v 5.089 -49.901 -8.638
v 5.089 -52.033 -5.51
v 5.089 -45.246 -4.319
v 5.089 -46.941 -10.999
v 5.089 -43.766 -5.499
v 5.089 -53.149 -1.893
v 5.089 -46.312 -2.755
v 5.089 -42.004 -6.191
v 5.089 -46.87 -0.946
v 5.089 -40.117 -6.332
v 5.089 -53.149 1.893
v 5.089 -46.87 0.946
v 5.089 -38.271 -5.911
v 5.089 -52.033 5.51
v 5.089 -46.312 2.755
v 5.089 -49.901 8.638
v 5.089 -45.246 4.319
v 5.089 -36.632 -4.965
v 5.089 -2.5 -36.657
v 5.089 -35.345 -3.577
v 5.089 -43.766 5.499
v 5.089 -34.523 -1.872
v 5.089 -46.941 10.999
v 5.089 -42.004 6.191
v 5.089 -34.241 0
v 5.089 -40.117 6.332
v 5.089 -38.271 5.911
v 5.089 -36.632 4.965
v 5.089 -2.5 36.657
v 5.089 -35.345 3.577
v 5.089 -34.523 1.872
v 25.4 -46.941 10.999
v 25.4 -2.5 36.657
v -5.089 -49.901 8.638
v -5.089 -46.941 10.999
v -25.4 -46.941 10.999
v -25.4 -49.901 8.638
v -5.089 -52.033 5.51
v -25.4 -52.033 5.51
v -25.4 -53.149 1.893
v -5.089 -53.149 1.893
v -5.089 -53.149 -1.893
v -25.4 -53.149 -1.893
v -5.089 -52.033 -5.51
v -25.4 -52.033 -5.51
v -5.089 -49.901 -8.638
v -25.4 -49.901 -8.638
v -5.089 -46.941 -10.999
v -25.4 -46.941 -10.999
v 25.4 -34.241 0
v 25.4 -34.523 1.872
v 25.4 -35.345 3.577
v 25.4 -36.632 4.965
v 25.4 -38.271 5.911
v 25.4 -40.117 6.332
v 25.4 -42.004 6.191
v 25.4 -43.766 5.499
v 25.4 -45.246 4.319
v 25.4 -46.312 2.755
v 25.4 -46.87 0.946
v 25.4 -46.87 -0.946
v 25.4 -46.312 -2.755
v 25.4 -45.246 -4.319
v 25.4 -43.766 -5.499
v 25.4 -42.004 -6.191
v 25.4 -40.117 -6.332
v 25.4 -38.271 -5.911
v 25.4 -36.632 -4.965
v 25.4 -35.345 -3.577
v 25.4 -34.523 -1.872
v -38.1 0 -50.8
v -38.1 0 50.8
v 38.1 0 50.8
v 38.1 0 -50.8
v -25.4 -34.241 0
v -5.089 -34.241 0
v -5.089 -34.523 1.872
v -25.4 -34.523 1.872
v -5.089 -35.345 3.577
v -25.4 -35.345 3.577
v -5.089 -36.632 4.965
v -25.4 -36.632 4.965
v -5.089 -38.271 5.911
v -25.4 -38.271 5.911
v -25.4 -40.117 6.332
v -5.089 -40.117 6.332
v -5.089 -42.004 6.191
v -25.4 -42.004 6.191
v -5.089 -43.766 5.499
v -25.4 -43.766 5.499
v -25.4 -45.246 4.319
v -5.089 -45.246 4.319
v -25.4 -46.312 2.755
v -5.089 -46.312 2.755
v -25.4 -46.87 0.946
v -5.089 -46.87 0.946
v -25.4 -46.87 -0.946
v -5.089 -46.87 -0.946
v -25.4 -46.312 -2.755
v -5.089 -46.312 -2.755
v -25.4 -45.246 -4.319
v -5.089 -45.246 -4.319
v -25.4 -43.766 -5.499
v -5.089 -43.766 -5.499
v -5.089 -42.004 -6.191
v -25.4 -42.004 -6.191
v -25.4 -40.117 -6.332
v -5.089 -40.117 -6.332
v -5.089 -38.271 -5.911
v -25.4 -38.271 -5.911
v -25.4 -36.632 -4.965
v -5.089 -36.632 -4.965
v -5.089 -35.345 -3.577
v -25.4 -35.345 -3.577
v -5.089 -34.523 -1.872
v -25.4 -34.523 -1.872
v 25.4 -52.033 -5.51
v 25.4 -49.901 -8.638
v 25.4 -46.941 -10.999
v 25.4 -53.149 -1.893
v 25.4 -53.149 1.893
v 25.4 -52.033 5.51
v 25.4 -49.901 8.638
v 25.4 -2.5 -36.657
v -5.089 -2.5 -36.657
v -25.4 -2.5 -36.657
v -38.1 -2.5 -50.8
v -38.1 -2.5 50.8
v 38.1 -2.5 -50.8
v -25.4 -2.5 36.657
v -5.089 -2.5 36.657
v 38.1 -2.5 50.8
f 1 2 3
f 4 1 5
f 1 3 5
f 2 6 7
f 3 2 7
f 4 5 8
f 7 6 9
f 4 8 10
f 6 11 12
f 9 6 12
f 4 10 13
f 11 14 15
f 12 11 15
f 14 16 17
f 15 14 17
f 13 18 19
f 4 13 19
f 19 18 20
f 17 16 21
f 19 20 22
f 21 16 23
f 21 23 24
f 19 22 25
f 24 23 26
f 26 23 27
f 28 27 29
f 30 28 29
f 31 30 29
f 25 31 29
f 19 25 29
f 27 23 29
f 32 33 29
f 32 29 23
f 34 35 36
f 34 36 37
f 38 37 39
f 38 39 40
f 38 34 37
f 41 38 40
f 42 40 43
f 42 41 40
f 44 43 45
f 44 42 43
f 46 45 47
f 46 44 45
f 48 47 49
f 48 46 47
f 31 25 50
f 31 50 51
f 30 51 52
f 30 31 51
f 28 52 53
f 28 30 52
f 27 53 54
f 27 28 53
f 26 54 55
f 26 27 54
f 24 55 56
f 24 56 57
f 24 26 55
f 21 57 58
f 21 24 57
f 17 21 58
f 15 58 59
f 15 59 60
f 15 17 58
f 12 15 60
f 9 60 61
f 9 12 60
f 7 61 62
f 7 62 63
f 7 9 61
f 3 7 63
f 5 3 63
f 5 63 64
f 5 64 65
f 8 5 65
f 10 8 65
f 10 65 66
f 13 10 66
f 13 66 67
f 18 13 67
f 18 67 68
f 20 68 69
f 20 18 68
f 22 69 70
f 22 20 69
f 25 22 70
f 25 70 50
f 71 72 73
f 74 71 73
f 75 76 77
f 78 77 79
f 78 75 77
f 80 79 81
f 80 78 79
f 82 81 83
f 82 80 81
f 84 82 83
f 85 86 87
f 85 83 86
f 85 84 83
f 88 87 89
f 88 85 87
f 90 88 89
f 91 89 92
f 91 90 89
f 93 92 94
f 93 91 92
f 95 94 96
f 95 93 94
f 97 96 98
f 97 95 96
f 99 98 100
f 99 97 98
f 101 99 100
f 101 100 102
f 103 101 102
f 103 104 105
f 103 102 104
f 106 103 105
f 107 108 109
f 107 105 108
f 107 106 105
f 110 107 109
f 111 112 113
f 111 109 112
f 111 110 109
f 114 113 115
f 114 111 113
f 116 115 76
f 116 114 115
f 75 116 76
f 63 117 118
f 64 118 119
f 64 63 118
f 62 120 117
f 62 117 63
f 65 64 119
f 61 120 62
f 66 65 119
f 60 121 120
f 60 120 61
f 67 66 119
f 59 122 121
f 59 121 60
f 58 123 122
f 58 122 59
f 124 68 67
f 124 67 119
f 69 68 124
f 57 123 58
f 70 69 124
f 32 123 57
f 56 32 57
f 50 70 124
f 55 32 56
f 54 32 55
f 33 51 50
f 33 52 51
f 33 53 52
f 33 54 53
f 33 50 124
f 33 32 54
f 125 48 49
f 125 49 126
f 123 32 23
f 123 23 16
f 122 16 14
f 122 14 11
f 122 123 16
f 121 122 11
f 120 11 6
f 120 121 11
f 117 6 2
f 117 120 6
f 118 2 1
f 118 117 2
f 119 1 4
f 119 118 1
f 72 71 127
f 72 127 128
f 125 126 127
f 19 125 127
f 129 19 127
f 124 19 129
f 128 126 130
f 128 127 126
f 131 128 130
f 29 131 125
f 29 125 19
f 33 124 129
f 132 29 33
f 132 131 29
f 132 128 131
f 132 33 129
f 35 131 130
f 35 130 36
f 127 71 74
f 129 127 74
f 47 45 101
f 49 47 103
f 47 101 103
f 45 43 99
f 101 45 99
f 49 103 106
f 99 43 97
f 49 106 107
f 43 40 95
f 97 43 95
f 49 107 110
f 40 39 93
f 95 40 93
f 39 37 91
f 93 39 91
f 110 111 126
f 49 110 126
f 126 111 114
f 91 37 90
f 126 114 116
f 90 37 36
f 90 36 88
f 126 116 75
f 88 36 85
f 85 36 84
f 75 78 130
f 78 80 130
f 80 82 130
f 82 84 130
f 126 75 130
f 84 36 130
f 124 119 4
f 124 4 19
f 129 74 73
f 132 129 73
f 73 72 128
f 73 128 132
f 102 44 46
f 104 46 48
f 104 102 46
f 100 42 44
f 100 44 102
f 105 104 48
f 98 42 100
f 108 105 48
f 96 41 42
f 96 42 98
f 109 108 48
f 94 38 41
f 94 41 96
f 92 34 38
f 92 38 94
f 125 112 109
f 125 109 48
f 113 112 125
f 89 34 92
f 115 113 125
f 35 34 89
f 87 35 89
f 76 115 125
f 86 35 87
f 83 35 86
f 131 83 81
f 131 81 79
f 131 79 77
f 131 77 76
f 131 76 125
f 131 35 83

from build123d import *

# Parameters (mm, degrees)
F0_W     = 76.2
F0_H     = 101.6
F1_DEPTH = 2.5
F2_R     = 6.35
F3_DEPTH = 25.4
F4_W     = 10.178574
F4_H     = 98.918622
F5_DEPTH = 75.946


with BuildPart() as f1:
    # F0 (on Front) → F1 (new body)
    with BuildSketch(Plane.XZ):
        Rectangle(F0_W, F0_H)
    extrude(amount=F1_DEPTH)

    # F2 (on Right) → F3 (join, symmetric)
    with BuildSketch(Plane.YZ):
        with BuildLine():
            Line((-46.941136, -10.998523), (0, -38.1))
            Line((0, -38.1), (0, 38.1))
            Line((0, 38.1), (-46.941136, 10.998523))
            ThreePointArc((-46.941136, 10.998523), (-53.291136, 0), (-46.941136, -10.998523))
        make_face()
        with Locations((-40.591136, 0)):
            Circle(F2_R, mode=Mode.SUBTRACT)
    extrude(amount=F3_DEPTH, both=True)

    # F4 (on Top) → F5 (cut, symmetric)
    with BuildSketch(Plane.XY):
        with Locations((0, -51.959311)):
            Rectangle(F4_W, F4_H)
    extrude(amount=F5_DEPTH, both=True, mode=Mode.SUBTRACT)


solid = f1.part
